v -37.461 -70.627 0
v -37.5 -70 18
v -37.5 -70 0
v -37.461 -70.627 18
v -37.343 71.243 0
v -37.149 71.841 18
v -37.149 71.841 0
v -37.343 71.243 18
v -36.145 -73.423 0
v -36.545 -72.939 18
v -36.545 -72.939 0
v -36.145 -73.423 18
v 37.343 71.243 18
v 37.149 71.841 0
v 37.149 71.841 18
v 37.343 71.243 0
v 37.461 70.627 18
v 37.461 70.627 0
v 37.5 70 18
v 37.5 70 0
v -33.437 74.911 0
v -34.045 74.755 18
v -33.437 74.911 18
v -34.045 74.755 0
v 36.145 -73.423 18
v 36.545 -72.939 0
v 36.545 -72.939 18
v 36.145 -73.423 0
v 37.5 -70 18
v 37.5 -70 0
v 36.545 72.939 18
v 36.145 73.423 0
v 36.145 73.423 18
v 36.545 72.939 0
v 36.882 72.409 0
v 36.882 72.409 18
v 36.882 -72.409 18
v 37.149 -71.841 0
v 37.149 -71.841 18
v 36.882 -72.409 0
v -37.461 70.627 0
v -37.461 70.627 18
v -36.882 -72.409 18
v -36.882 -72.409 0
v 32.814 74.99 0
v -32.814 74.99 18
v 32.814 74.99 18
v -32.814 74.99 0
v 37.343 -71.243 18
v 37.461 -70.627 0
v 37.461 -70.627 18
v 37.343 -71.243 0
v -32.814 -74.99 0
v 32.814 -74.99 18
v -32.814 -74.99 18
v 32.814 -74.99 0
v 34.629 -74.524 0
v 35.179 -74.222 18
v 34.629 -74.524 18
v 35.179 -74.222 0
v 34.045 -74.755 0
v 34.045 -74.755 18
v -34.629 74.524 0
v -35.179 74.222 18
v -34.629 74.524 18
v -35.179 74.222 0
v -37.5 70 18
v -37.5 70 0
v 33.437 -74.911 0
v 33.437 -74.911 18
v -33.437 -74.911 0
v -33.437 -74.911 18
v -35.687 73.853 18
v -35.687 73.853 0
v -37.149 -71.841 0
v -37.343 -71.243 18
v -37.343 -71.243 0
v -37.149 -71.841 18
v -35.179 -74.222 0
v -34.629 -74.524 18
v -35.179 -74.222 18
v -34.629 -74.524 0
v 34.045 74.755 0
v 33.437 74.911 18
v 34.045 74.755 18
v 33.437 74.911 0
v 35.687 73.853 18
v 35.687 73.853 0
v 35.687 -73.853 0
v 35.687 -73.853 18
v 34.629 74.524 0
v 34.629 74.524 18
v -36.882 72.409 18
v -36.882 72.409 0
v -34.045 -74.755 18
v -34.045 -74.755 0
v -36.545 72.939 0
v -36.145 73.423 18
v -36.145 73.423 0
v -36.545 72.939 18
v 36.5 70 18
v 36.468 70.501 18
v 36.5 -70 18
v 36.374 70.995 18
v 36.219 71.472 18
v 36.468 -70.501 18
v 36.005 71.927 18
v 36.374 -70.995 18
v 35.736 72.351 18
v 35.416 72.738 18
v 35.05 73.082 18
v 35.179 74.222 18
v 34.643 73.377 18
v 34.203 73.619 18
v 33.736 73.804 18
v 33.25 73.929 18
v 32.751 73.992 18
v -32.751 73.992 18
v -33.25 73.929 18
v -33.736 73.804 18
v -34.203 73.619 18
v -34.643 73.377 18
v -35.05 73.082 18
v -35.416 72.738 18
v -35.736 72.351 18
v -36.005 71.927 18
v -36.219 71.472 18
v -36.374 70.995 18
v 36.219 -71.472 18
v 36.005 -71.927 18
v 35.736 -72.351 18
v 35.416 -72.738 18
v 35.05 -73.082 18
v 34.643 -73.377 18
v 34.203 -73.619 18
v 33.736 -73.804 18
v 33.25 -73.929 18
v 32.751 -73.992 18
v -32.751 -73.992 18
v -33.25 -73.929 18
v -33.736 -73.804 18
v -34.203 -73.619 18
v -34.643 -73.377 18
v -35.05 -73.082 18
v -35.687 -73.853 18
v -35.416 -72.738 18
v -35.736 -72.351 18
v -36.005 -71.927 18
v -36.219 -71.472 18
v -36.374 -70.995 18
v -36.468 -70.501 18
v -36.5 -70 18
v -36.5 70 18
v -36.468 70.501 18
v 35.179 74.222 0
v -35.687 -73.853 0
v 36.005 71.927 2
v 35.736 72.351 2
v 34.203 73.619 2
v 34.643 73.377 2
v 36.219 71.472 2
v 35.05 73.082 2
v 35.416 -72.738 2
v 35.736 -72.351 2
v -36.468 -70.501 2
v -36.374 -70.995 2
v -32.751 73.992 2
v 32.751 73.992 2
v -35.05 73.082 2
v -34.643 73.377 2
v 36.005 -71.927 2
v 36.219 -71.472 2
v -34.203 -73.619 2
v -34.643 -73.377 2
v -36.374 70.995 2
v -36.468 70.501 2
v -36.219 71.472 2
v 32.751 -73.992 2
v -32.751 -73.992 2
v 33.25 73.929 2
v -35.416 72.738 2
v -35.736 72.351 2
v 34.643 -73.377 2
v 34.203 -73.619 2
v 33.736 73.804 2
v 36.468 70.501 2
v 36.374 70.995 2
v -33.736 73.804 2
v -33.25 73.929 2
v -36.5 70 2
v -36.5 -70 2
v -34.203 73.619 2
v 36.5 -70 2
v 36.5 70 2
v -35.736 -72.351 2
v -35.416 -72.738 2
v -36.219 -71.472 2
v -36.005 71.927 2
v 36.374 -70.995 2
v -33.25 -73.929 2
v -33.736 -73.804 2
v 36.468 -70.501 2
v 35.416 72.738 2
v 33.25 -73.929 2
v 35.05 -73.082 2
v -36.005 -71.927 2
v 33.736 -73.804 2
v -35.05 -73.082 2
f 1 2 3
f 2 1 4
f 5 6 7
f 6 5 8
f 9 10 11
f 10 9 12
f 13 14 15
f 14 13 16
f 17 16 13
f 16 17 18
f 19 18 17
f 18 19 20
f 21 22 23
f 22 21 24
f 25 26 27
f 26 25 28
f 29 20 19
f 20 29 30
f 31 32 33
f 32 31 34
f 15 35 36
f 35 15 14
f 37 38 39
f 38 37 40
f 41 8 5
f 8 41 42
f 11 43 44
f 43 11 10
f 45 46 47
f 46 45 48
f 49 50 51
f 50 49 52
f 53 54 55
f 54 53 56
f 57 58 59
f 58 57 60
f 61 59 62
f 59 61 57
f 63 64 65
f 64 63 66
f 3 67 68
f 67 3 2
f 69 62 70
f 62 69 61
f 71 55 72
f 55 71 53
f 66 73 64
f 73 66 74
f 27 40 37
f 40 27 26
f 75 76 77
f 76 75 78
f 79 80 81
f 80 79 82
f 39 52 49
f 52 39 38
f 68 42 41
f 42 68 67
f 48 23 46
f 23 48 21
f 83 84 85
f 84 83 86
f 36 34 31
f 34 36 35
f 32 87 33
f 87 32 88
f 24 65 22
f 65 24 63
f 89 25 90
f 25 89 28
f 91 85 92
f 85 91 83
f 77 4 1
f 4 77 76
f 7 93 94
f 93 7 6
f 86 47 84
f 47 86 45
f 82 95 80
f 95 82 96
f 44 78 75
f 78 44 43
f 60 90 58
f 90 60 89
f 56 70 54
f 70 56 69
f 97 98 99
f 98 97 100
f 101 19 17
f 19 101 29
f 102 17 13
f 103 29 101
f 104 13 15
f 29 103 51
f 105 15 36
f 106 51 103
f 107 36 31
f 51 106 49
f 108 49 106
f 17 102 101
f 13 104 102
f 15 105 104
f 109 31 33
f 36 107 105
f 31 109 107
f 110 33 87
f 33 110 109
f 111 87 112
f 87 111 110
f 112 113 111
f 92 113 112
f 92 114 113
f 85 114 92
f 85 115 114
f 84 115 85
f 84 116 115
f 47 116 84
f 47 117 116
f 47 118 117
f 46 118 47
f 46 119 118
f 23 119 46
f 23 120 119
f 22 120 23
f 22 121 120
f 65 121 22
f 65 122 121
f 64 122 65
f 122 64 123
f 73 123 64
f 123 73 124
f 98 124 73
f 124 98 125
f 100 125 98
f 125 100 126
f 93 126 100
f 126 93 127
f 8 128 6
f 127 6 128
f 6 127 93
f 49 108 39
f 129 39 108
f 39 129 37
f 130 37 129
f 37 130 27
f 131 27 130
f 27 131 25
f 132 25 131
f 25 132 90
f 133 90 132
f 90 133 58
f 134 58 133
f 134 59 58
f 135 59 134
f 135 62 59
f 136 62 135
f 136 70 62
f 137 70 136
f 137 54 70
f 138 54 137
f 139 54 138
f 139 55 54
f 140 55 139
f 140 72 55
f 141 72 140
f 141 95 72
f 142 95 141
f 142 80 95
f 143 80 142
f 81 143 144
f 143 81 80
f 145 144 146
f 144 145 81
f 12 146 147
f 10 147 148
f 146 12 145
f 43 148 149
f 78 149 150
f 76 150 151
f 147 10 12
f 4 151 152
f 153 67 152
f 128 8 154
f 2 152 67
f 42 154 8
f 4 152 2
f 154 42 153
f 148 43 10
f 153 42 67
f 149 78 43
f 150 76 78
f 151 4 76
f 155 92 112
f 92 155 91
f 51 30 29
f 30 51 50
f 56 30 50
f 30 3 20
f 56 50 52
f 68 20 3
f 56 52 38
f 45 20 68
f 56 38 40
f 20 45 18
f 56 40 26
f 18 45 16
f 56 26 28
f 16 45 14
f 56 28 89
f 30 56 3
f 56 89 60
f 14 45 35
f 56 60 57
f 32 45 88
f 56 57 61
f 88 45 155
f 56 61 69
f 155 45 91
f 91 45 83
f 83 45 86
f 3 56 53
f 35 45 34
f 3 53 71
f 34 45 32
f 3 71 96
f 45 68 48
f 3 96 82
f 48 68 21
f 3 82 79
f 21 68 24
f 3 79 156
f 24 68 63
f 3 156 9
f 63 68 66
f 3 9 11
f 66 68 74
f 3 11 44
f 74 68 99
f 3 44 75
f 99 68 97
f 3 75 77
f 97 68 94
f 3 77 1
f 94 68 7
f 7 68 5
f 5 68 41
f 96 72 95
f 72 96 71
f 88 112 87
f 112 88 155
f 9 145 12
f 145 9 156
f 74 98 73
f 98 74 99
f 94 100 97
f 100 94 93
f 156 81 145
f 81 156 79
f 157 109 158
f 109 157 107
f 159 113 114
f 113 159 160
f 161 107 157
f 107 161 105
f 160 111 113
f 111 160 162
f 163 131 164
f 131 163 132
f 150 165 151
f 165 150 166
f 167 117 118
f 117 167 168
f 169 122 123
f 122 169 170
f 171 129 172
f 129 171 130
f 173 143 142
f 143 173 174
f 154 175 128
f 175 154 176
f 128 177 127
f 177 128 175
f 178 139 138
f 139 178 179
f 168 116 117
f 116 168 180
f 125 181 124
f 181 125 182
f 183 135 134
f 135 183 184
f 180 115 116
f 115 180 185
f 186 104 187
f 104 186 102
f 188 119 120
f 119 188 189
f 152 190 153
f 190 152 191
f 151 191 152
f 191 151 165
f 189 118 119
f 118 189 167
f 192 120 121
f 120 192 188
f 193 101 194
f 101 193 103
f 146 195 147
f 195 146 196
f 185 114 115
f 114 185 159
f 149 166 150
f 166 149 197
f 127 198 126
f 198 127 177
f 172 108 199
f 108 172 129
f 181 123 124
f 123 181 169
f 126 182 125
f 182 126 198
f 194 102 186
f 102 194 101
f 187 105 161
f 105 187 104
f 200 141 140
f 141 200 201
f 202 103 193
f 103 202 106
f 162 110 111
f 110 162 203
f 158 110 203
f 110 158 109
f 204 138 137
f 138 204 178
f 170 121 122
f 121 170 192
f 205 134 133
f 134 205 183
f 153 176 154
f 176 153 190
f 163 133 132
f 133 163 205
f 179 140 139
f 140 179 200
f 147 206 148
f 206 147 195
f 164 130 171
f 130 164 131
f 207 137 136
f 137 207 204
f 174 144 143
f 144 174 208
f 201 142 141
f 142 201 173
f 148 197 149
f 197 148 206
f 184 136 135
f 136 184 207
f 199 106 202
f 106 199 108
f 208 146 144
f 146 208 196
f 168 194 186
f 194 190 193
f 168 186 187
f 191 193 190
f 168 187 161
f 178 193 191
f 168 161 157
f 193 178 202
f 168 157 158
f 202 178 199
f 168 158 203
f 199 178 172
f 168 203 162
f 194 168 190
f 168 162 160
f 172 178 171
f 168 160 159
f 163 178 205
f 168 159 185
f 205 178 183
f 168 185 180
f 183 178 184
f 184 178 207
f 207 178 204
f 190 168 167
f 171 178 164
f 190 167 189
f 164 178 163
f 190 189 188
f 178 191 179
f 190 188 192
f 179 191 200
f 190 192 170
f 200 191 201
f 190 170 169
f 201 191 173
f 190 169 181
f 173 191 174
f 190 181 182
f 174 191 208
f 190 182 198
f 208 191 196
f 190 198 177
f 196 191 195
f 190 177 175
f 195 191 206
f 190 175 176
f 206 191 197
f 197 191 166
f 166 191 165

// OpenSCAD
$fn = 50;


difference() {
	union() {
		hull() {
			translate(v = [-32.5000000000, 70.0000000000, 0]) {
				cylinder(h = 18, r = 5);
			}
			translate(v = [32.5000000000, 70.0000000000, 0]) {
				cylinder(h = 18, r = 5);
			}
			translate(v = [-32.5000000000, -70.0000000000, 0]) {
				cylinder(h = 18, r = 5);
			}
			translate(v = [32.5000000000, -70.0000000000, 0]) {
				cylinder(h = 18, r = 5);
			}
		}
	}
	union() {
		translate(v = [0, 0, 2]) {
			hull() {
				translate(v = [-32.5000000000, 70.0000000000, 0]) {
					cylinder(h = 16, r = 4);
				}
				translate(v = [32.5000000000, 70.0000000000, 0]) {
					cylinder(h = 16, r = 4);
				}
				translate(v = [-32.5000000000, -70.0000000000, 0]) {
					cylinder(h = 16, r = 4);
				}
				translate(v = [32.5000000000, -70.0000000000, 0]) {
					cylinder(h = 16, r = 4);
				}
			}
		}
	}
}
